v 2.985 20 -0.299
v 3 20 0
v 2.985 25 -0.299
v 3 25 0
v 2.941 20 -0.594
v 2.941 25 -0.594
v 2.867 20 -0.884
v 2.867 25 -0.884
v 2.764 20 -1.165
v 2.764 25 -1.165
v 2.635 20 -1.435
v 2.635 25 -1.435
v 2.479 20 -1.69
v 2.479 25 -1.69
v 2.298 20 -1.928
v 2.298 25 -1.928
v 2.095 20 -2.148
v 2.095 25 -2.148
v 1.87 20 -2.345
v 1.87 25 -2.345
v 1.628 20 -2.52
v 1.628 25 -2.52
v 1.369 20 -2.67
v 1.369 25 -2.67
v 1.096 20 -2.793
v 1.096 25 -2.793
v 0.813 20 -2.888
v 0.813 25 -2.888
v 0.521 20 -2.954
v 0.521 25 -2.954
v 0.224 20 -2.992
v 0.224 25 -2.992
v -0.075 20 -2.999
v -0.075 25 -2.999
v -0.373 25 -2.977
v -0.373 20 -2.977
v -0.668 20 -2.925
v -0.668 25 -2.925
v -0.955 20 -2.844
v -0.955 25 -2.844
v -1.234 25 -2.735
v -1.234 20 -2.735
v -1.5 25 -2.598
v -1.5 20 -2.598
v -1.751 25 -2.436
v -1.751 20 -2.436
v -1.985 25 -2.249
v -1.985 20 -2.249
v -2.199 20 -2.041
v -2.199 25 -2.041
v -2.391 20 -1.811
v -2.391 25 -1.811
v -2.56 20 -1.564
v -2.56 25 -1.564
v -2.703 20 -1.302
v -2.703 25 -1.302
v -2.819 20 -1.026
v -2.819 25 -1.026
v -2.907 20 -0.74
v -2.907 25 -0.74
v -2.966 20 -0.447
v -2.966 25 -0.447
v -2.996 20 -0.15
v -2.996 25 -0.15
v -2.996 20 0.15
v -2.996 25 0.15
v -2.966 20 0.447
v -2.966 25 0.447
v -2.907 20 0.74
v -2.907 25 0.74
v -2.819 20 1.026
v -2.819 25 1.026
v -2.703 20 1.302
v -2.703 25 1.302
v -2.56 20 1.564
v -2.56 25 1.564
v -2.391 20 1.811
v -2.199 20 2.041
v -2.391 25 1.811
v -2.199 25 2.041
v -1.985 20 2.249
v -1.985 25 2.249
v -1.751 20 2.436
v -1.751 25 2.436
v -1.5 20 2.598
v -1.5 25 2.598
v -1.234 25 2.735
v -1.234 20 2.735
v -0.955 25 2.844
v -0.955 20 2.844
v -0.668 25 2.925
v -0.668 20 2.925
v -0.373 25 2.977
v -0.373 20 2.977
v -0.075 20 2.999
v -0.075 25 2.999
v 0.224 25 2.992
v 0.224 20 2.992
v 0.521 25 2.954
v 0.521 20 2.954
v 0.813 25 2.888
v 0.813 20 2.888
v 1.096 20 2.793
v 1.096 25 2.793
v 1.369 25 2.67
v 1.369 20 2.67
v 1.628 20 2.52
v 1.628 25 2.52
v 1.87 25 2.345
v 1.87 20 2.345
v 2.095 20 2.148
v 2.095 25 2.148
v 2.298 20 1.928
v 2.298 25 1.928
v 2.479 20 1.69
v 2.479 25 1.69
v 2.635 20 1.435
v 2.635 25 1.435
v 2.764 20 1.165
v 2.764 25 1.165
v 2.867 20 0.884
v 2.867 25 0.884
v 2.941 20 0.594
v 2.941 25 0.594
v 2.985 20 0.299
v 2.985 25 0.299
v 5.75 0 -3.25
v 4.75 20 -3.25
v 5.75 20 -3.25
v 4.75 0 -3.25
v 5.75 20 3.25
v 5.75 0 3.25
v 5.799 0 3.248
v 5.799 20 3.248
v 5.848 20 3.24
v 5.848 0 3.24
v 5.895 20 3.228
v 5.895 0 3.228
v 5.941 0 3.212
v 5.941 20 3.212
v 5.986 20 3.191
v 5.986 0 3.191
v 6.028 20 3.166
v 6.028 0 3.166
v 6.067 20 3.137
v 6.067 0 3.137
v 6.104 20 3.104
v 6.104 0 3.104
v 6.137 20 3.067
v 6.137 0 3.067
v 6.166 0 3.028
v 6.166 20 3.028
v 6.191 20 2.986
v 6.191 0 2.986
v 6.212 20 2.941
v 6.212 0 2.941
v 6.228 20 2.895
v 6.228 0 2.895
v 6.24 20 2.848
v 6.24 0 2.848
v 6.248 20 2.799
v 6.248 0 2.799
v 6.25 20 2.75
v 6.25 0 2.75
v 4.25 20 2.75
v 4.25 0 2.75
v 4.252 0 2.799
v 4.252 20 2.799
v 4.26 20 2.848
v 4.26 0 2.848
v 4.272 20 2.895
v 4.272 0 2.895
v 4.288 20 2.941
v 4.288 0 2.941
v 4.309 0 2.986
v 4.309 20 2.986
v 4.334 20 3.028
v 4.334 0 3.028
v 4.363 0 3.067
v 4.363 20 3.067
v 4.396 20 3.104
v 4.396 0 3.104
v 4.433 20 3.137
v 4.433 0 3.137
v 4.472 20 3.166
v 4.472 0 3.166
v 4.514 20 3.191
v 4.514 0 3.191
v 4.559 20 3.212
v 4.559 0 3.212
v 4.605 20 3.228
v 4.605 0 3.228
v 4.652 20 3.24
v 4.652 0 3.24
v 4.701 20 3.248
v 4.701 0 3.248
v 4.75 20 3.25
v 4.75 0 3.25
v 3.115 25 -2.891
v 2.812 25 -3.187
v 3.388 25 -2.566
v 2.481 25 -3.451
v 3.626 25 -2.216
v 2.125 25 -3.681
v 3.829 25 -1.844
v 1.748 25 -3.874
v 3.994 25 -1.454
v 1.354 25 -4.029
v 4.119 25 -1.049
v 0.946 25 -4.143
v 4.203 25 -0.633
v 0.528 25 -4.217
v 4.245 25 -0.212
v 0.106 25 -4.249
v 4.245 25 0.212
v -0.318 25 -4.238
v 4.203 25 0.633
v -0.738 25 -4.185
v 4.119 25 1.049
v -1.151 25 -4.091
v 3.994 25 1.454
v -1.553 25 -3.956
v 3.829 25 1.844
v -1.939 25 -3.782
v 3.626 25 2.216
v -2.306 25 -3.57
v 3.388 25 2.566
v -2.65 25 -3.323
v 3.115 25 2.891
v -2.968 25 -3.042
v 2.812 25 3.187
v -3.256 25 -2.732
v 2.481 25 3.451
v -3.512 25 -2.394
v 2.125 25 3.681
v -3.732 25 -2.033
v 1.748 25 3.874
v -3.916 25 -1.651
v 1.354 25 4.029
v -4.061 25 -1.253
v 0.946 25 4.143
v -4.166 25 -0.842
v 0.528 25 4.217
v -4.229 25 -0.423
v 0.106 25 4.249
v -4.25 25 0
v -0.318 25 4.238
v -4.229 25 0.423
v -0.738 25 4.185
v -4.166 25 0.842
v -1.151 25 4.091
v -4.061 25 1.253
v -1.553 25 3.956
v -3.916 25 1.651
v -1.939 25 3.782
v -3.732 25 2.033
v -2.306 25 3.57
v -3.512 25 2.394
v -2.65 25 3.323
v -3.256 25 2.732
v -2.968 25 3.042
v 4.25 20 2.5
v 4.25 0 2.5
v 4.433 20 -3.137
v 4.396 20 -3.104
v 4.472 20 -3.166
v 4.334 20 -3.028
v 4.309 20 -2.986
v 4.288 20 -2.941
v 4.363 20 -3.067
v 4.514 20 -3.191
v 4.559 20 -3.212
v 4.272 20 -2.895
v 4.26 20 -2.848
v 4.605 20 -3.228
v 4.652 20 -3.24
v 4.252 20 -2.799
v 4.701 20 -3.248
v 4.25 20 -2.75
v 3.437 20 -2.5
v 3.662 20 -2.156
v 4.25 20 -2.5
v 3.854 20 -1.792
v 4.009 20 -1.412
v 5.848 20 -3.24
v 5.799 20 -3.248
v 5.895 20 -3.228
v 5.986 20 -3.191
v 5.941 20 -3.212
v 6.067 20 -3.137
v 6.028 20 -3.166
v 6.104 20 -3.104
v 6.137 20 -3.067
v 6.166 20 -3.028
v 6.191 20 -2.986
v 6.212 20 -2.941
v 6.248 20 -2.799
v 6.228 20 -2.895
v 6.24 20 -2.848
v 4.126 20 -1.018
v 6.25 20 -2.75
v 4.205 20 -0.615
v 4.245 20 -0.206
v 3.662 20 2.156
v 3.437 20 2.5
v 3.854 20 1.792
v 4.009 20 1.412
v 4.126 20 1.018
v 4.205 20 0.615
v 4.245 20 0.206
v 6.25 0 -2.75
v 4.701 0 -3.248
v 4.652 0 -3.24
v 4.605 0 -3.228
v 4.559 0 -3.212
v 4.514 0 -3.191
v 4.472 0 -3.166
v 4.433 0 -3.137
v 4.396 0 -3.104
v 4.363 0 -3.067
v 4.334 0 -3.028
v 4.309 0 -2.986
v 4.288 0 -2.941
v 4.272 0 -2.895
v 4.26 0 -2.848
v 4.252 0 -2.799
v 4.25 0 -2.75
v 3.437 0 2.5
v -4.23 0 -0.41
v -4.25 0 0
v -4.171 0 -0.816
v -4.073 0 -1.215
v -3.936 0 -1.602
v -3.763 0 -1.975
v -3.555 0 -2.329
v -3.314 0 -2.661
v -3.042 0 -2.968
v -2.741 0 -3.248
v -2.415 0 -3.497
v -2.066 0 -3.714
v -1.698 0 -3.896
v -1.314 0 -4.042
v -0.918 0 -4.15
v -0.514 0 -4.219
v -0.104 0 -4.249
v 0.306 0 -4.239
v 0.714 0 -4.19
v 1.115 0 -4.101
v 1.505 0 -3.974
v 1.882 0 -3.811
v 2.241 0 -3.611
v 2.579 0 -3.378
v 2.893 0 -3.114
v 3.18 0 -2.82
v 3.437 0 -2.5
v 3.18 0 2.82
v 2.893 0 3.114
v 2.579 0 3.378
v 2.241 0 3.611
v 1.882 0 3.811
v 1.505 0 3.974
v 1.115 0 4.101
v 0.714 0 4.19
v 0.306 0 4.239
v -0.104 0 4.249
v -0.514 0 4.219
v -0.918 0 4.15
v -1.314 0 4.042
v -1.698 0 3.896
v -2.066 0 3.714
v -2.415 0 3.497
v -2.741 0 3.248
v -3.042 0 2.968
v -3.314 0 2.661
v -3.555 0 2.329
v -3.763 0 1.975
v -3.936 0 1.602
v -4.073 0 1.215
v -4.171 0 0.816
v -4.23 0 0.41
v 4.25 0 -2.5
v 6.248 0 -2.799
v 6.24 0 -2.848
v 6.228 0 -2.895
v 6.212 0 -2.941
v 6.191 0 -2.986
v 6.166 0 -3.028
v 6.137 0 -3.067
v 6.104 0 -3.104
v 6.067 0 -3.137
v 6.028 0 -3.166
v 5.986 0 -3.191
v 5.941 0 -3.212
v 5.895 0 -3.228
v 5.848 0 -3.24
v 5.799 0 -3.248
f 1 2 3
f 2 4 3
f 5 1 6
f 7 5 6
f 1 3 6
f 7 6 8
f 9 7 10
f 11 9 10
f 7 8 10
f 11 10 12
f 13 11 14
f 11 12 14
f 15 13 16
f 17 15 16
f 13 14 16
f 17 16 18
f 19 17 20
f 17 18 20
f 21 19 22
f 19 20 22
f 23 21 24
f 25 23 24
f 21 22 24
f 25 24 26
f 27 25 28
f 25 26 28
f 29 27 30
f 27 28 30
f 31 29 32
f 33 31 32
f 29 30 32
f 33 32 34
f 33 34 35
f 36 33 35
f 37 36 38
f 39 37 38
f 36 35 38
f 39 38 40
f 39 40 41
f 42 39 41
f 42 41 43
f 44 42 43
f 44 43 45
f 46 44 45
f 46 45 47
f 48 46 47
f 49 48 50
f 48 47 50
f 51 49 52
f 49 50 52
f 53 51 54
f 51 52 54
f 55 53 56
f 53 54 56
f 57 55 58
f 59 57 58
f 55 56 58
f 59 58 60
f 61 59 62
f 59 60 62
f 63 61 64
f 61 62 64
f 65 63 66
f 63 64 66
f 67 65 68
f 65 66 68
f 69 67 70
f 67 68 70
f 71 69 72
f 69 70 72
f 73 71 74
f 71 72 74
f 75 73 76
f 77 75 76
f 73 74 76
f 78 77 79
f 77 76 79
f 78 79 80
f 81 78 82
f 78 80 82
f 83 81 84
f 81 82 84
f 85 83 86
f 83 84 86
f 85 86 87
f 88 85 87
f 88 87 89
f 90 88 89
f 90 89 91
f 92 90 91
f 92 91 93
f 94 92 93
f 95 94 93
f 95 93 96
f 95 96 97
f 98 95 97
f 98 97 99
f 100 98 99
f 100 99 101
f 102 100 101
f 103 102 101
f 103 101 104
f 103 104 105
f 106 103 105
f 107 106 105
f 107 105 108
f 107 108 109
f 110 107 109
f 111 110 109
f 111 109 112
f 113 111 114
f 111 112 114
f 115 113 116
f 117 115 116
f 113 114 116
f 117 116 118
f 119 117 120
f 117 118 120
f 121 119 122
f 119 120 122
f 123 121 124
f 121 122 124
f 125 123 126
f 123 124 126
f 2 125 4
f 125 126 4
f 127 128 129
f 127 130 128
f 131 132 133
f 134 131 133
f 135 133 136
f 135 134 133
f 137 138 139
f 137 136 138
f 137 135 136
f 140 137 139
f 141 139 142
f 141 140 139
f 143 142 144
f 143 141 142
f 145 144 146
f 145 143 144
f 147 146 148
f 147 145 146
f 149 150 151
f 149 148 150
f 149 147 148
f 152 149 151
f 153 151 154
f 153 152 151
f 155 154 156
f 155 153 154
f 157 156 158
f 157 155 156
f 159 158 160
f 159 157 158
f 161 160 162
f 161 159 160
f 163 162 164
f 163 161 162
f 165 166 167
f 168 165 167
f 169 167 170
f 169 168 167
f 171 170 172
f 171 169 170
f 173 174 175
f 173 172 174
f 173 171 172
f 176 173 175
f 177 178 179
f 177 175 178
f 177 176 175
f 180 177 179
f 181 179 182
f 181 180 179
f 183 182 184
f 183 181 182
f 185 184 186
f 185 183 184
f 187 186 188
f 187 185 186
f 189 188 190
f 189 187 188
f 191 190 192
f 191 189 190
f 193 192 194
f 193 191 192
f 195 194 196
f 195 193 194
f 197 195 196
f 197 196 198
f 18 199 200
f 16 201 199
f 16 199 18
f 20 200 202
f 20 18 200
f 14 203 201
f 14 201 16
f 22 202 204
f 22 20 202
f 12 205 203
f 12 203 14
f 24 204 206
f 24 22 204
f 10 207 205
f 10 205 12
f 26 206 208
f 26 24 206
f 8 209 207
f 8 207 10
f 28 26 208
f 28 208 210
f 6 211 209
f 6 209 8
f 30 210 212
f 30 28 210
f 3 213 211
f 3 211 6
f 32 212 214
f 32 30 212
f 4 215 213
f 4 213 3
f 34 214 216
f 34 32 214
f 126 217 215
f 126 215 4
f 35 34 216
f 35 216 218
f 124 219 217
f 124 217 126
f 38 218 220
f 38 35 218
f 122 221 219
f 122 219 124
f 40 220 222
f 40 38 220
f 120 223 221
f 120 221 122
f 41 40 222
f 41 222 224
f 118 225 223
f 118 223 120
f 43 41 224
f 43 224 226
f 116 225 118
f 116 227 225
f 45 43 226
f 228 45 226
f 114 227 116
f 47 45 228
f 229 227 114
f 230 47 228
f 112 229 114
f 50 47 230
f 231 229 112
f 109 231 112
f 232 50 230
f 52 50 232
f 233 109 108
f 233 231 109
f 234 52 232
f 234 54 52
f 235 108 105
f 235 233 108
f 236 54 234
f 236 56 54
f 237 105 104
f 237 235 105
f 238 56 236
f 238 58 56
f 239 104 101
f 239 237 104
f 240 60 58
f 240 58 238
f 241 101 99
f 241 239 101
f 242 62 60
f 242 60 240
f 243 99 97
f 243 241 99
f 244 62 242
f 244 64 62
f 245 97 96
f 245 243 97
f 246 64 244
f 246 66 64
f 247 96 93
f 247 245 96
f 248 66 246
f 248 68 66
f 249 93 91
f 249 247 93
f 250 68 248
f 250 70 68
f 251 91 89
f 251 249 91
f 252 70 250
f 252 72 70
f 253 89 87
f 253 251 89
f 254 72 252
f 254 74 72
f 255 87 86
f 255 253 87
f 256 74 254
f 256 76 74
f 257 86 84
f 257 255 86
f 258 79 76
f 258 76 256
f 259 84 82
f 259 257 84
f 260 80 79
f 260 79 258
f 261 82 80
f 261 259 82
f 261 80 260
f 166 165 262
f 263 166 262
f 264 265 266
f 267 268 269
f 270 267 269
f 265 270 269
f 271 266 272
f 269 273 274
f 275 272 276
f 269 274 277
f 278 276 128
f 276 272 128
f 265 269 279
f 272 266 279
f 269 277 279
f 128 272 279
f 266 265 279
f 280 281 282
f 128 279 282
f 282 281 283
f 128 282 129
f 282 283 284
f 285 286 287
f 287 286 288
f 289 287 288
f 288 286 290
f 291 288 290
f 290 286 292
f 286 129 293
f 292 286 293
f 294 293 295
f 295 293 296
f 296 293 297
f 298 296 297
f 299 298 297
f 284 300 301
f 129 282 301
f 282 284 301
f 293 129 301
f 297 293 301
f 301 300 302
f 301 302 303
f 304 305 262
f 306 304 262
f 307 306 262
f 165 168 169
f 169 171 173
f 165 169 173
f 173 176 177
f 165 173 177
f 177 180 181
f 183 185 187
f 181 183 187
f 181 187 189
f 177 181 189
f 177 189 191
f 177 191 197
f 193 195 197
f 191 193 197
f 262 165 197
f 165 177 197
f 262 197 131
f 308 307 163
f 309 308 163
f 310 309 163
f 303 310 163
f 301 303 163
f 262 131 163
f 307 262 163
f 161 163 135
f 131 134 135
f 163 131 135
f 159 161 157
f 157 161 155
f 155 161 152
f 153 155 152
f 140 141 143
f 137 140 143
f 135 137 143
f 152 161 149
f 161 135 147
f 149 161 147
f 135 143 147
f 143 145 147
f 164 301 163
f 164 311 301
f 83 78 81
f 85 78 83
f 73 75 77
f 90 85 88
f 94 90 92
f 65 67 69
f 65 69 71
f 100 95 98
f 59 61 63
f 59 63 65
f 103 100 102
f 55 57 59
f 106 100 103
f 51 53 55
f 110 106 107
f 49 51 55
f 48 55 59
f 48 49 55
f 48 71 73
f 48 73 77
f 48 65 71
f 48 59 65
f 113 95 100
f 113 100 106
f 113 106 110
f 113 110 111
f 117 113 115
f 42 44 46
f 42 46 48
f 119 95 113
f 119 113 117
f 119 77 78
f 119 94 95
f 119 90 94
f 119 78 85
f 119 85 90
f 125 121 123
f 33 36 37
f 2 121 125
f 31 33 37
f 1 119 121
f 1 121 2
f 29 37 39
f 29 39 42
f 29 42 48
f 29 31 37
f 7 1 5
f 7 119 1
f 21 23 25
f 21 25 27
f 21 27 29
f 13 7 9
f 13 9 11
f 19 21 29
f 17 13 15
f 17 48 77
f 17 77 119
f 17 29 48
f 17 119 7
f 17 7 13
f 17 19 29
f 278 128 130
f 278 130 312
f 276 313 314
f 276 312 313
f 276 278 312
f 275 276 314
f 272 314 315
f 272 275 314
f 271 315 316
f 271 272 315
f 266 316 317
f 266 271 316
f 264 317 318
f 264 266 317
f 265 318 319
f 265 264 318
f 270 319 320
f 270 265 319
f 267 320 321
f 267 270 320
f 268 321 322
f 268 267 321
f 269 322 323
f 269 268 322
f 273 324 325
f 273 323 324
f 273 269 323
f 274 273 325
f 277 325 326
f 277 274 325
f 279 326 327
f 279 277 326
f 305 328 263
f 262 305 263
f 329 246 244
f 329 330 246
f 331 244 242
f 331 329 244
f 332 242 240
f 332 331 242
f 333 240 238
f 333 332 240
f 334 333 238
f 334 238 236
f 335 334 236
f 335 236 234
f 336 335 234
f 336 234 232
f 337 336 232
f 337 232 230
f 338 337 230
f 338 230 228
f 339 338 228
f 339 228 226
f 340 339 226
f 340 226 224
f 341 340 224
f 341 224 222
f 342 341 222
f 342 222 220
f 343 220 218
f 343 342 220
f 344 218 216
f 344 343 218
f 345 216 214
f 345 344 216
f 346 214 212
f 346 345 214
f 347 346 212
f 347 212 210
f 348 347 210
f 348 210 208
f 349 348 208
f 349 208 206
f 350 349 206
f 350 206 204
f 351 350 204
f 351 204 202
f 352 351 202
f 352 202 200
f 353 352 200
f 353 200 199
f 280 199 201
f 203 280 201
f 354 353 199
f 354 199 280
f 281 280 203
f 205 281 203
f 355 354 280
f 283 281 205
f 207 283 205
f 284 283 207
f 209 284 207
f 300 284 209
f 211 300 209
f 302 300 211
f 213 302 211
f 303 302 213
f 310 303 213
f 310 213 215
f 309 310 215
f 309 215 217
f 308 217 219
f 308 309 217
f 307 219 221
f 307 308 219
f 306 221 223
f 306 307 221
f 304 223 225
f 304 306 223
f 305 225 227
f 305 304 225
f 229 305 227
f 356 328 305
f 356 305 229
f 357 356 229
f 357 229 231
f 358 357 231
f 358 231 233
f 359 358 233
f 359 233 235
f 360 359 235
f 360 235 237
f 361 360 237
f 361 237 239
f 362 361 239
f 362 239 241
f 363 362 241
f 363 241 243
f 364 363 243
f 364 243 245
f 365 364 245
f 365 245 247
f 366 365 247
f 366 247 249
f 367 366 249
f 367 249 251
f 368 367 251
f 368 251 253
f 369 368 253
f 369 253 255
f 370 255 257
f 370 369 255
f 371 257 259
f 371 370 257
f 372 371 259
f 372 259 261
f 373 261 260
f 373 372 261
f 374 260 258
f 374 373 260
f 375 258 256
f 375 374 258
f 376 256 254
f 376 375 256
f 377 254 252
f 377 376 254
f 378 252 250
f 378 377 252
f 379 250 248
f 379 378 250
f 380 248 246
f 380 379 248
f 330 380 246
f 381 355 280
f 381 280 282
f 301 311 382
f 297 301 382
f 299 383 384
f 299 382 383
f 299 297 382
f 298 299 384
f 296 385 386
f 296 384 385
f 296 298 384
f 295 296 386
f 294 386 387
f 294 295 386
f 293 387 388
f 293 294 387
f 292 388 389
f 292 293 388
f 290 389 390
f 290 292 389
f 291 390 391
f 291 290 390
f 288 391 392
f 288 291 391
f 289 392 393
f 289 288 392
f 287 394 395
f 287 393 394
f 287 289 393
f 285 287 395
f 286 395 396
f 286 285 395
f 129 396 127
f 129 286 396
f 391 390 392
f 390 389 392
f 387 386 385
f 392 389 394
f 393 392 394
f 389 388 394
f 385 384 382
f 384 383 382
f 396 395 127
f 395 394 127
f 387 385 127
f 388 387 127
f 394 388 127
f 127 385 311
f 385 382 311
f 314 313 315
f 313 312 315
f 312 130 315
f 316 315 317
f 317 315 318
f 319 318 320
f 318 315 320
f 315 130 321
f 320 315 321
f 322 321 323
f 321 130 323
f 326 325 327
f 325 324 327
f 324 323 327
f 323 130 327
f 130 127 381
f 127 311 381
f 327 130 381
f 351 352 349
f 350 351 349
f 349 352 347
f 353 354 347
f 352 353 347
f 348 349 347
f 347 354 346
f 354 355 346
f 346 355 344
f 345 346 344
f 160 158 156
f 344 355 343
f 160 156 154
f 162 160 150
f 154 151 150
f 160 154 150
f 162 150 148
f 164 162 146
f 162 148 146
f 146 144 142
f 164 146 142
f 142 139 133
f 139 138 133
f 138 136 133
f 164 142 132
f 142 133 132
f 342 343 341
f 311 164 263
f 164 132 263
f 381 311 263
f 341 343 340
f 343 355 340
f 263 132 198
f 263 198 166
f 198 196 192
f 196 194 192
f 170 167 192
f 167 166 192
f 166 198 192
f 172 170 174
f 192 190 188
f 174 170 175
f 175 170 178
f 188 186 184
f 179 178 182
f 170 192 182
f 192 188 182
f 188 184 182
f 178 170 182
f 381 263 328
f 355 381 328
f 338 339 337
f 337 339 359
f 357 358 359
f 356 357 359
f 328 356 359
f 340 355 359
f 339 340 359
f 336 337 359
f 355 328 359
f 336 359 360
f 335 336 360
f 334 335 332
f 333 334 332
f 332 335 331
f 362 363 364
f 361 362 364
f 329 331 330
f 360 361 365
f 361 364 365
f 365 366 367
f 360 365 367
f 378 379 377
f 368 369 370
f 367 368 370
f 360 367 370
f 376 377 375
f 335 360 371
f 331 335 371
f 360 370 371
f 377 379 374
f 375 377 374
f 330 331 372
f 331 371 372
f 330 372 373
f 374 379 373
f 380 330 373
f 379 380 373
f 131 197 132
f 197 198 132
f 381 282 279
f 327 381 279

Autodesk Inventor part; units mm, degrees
ref_plane "YZ Plane" through (0, 0, 0) normal (1, 0, 0) x (0, 1, 0)
ref_plane "XZ Plane" through (0, 0, 0) normal (0, 1, 0) x (-1, 0, 0)
ref_plane "XY Plane" through (0, 0, 0) normal (0, 0, 1) x (1, 0, 0)
sketch "スケッチ1" plane through (0, 0, 0) normal (0, 0, 1) x (1, 0, 0)
  line L0 (0, 25) -> (-4.25, 25)
  line L1 (-4.25, 25) -> (-4.25, 0)
  line L2 (-4.25, 0) -> (0, 0)
  line L3 (0, 0) -> (0, 25)
  line L4 (0, -5) -> (0, 30) projected
  line L5 (-5.1, 0) -> (0.85, 0) projected
  dimension "d2" = 4.25
  dimension "d3" = 25
revolve "回転1" add sketch "スケッチ1" angle 360 about axis through (0, -10, 0) along (0, 1, 0)
sketch "スケッチ3" plane through (0, 25, 0) normal (0, 1, 0) x (1, 0, 0)
  circle A0 centre (0, 0) radius 3
  dimension "d5" = 6
extrude "押し出し1" cut sketch "スケッチ3" against normal blind 5
sketch "スケッチ4" plane through (0, 0, 0) normal (0, -1, 0) x (1, 0, 0)
  circle A0 centre (0, 0) radius 4.25 projected
  line L0 (4.25, 3.25) -> (6.25, 3.25)
  line L1 (4.25, -3.25) -> (6.25, -3.25)
  line L2 (6.25, -3.25) -> (6.25, 3.25)
  line L3 (3.4369, 2.5) -> (4.25, 2.5)
  line L4 (-6.15, 0) -> (7.15, 0) projected
  line L5 (4.25, 3.25) -> (4.25, 2.5)
  line L6 (4.25, 0) -> (4.25, -3.25)
  line L7 (3.4369, -2.5) -> (4.25, -2.5)
  dimension "d9" = 6.5
  dimension "d10" = 2
  dimension "d11" = 2.5
  dimension "d12" = 5
extrude "押し出し2" add sketch "スケッチ4" against normal blind 20 contours L6 L7 A0 | A0 L3 L5 L0 L2 L4 | L4 L2 L1 L6
fillet "フィレット1" radius 0.5 4 edges at (6.25, 10, 3.25) (6.25, 10, -3.25) (4.25, 10, -3.25) (4.25, 10, 3.25)
properties part number "flat_cover_6mm"
